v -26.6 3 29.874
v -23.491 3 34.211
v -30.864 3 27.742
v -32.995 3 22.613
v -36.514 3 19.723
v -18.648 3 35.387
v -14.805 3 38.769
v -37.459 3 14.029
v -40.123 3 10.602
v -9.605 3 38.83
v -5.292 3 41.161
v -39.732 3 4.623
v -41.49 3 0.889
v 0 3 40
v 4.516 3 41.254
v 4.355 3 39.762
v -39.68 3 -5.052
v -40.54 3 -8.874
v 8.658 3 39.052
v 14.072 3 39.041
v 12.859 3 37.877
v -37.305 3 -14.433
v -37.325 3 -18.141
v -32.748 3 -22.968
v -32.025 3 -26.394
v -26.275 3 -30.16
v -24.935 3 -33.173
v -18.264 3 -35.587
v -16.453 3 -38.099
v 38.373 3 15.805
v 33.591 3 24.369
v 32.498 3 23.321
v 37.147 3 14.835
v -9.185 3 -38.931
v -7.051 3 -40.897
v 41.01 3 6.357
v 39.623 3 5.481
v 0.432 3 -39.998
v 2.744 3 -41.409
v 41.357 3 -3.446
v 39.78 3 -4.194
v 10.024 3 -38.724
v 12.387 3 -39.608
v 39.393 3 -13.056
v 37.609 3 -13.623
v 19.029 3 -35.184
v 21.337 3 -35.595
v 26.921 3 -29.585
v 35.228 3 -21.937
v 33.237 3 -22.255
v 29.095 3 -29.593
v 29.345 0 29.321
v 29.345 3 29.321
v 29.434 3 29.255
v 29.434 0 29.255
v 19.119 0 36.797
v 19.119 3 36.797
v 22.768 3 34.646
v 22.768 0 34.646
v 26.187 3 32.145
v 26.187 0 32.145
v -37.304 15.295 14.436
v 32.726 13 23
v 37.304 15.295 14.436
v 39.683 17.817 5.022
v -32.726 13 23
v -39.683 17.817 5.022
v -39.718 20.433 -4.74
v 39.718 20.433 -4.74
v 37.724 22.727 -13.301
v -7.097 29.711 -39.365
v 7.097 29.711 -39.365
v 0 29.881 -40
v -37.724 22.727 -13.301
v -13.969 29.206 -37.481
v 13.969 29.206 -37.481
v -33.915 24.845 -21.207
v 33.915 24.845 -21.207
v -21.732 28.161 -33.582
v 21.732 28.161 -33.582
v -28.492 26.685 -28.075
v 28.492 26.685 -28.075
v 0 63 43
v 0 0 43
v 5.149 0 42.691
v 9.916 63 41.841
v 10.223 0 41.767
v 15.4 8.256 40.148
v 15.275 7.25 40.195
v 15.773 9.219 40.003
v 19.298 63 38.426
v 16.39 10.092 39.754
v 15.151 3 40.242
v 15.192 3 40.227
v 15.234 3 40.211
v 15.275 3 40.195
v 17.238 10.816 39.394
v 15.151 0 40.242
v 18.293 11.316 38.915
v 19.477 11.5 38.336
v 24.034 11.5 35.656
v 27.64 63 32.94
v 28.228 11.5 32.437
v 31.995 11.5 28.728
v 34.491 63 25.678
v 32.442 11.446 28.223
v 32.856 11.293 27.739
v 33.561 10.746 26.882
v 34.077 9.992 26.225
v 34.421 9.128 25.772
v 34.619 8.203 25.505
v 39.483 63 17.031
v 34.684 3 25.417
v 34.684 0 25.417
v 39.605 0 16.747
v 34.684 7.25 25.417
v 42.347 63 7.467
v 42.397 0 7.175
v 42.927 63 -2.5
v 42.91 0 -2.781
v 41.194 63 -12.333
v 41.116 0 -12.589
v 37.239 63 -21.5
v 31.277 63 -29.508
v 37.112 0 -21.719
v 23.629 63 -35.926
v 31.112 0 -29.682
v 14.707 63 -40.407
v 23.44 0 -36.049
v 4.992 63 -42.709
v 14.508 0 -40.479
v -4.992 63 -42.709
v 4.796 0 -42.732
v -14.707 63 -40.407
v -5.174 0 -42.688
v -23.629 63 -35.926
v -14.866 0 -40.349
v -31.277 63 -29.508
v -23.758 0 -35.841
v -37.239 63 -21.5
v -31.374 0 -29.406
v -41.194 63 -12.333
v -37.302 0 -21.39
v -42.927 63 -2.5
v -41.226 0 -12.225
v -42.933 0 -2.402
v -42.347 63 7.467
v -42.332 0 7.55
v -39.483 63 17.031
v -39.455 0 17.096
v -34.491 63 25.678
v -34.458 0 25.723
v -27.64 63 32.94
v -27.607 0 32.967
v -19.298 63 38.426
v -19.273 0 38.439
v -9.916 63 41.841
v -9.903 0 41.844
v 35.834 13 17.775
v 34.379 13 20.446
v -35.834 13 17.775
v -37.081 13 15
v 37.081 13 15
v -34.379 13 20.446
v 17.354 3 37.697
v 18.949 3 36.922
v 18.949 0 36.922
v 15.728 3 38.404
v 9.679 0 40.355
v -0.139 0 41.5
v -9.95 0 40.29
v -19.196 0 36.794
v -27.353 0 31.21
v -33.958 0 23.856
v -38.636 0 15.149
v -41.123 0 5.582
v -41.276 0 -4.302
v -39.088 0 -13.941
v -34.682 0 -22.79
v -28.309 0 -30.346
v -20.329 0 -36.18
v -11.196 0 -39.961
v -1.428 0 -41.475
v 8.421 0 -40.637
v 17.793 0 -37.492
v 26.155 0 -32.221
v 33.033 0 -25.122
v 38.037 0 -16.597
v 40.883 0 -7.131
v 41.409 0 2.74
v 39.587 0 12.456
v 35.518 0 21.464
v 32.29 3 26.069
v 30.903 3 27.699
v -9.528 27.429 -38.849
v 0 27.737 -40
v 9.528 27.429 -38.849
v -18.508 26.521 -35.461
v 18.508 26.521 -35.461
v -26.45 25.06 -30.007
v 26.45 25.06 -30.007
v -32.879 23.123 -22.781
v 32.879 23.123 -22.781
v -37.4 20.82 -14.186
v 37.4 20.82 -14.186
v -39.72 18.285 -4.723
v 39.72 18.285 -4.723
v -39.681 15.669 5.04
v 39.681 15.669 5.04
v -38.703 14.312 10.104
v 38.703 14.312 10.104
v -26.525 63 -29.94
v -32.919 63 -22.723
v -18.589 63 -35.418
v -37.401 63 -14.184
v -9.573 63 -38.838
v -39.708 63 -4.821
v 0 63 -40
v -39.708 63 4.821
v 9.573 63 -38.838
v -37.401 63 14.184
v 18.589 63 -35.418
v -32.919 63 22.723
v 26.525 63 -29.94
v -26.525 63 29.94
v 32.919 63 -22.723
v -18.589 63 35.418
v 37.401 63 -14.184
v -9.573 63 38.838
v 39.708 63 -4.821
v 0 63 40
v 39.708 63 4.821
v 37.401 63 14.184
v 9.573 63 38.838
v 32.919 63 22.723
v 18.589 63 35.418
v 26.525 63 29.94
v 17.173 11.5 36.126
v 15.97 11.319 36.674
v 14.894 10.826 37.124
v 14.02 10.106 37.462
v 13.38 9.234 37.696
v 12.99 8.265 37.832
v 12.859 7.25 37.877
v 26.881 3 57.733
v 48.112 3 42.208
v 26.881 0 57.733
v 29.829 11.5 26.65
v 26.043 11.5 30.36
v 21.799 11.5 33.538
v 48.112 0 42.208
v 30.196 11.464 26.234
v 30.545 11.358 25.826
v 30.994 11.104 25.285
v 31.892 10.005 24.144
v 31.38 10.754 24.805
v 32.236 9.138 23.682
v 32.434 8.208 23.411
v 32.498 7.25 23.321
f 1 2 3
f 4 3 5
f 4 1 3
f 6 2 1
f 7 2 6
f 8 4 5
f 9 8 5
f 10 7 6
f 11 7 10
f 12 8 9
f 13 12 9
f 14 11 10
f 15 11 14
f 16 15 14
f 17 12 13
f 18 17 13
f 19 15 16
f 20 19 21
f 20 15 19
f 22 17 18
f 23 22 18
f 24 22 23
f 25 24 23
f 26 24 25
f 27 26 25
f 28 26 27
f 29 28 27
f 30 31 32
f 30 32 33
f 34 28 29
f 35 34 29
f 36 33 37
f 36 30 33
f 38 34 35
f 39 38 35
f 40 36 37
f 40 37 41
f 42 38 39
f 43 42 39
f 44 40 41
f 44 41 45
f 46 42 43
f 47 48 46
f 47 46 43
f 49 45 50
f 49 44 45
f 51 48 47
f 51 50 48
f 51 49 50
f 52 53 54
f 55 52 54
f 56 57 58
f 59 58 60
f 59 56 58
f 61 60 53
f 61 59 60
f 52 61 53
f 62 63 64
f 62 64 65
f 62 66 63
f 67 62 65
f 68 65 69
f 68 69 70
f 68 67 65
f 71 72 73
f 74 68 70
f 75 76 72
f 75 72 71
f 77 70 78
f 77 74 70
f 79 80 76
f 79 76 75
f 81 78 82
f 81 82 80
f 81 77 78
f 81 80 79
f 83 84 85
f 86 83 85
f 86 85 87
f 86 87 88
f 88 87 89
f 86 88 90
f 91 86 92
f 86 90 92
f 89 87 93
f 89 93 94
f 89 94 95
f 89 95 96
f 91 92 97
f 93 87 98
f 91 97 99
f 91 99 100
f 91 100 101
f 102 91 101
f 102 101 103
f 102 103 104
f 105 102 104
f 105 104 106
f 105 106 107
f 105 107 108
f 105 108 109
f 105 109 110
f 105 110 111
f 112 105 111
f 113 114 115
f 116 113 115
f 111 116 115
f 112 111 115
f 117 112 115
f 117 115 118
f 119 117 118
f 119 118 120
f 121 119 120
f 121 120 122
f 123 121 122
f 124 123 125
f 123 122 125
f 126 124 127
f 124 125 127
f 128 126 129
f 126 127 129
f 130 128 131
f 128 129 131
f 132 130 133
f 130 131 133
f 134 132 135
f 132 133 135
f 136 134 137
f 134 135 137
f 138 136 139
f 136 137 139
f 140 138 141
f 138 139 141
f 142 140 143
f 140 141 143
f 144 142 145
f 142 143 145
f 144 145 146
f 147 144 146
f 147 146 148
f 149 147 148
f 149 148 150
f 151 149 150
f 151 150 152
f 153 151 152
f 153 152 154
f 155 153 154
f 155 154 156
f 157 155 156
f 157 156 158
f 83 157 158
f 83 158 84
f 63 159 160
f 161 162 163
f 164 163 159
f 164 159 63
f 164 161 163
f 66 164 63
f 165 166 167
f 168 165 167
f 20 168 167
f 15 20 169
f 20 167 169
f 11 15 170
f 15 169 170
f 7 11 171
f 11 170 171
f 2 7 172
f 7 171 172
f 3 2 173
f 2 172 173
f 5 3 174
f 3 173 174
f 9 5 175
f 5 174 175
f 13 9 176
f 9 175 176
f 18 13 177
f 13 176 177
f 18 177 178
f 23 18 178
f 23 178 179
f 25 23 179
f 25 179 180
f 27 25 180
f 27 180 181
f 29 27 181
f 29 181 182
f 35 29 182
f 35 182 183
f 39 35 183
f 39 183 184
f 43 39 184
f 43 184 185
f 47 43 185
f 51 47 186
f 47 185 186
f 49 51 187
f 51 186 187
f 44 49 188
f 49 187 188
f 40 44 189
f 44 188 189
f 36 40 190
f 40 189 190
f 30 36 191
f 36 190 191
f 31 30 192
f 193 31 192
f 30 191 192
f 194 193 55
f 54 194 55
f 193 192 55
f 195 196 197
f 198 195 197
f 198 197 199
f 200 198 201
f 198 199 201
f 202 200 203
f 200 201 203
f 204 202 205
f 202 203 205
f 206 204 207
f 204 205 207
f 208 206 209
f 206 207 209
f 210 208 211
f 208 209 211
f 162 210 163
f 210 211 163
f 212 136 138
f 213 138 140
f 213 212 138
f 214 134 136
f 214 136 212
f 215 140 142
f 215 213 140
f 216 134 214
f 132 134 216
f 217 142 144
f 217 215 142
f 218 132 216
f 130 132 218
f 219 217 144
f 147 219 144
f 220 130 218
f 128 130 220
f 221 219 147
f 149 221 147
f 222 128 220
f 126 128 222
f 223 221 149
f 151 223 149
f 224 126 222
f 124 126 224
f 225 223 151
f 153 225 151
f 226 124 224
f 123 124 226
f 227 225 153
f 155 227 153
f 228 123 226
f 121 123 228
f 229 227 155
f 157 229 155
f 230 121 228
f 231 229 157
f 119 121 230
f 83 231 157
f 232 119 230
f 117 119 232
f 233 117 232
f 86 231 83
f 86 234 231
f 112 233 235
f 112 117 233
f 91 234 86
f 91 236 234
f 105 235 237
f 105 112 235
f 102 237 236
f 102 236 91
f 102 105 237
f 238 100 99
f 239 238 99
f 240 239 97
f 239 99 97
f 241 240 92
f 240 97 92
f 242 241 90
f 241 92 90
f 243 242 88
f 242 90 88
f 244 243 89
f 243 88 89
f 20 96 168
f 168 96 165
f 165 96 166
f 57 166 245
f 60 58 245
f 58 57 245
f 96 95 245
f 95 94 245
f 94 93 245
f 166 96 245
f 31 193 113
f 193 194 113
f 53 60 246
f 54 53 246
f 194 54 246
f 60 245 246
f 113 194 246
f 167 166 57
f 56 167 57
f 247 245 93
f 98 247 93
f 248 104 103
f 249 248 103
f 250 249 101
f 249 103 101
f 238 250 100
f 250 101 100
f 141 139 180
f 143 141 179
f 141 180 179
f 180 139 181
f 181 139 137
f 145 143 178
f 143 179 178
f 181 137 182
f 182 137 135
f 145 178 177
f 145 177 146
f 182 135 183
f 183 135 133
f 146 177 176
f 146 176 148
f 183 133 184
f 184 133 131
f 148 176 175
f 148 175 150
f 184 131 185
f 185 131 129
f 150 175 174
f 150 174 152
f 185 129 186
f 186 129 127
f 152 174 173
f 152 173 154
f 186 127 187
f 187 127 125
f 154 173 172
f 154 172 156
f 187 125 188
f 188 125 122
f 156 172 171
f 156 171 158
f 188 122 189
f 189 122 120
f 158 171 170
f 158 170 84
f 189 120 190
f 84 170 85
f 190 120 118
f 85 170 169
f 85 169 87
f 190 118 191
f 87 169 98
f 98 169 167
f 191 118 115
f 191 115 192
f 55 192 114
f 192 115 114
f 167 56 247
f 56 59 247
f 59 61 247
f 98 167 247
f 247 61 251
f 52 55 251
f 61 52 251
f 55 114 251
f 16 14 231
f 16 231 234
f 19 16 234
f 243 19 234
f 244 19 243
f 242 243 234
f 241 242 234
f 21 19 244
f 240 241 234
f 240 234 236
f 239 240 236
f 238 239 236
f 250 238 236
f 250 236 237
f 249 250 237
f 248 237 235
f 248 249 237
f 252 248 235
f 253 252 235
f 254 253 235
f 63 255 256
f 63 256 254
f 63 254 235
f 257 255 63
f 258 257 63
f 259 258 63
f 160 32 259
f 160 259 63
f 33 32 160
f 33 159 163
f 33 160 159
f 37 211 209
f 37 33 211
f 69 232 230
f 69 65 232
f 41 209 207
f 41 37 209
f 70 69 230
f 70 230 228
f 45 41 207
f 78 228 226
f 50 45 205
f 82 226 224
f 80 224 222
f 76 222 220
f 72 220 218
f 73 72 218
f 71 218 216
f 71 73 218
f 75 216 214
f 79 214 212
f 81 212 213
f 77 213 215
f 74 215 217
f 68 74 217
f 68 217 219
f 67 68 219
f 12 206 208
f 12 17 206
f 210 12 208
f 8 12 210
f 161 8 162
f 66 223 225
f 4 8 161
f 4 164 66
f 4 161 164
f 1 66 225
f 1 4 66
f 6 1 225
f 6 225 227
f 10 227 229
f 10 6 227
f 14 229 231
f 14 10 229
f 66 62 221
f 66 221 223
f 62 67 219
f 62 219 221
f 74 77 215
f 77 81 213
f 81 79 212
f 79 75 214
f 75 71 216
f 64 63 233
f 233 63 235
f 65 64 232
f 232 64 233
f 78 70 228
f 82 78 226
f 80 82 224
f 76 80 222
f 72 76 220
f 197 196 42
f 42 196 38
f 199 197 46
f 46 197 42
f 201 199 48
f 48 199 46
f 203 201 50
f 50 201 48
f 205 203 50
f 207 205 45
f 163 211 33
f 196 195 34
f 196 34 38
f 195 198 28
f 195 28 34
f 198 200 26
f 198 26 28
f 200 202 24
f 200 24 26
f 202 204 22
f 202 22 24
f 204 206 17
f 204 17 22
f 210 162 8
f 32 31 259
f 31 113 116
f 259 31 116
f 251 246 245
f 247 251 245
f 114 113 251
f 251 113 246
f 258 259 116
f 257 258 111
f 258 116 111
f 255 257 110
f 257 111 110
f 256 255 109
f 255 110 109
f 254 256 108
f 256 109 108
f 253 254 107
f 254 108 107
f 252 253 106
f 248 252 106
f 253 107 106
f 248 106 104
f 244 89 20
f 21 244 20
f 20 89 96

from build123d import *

# Parameters (mm, degrees)
SKETCH1_R                            = 43
SKETCH1_R_2                          = 40
BOSS_EXTRUDE1_DEPTH                  = 63
SKETCH2_R                            = 41.5
SKETCH2_R_2                          = 40
CUT_EXTRUDE1_DEPTH                   = 3
BOSS_EXTRUDE2_REACH                  = 89.561
BOSS_EXTRUDE2_END_RADIUS             = 40
BOSS_EXTRUDE2_DIRECTION_2_REACH      = 89.561
BOSS_EXTRUDE2_DIRECTION_2_END_RADIUS = 40
BOSS_EXTRUDE3_DEPTH                  = 70
CUT_EXTRUDE2_REACH                   = 125.284
CUT_EXTRUDE2_END_RADIUS              = 40
CUT_EXTRUDE3_DEPTH                   = 100.163089401
BOSS_EXTRUDE6_DEPTH                  = 3
CUT_EXTRUDE4_DEPTH                   = 4


with BuildPart() as part:
    # Sketch1 → Boss-Extrude1 (new body)
    with BuildSketch(Plane(origin=(0, 0, 0), x_dir=(1, 0, 0), z_dir=(0, 1, 0))):
        with Locations(Location((0, 0, 0), (0, 0, 270))):
            Circle(SKETCH1_R)
        with Locations(Location((0, 0, 0), (0, 0, 270))):
            Circle(SKETCH1_R_2, mode=Mode.SUBTRACT)
    extrude(amount=BOSS_EXTRUDE1_DEPTH)

    # Sketch2 → Cut-Extrude1 (cut)
    with BuildSketch(Plane(origin=(0, 0, 0), x_dir=(-1, 0, 0), z_dir=(0, -1, 0))):
        with Locations(Location((0, 0, 0), (0, 0, 90))):
            Circle(SKETCH2_R)
        with Locations(Location((0, 0, 0), (0, 0, 90))):
            Circle(SKETCH2_R_2, mode=Mode.SUBTRACT)
    extrude(amount=-CUT_EXTRUDE1_DEPTH, mode=Mode.SUBTRACT)

    # Boss-Extrude2: up to this cylinder (the profile starts inside it)
    boss_extrude2_end = Plane(origin=(0, 21.31795, 0), z_dir=(0, -1, 0)) * Cylinder(BOSS_EXTRUDE2_END_RADIUS, 260.122, mode=Mode.PRIVATE)
    # Sketch4 → Boss-Extrude2 (add, up to the surface)
    with BuildSketch(Plane(origin=(0, 0, 0), x_dir=(0, 0, -1), z_dir=(1, 0, 0)), mode=Mode.PRIVATE) as boss_extrude2_sk1:
        Polygon((-23, 13), (43, 30.6846467), (43, 28.541053161), (-15, 13), align=None)
    boss_extrude2_tool1 = extrude(boss_extrude2_sk1.sketch, amount=-BOSS_EXTRUDE2_REACH, mode=Mode.PRIVATE) & boss_extrude2_end
    add(boss_extrude2_tool1.solids().sort_by_distance((0, 21.31795, -11.956989))[0])

    # Boss-Extrude2 direction 2: up to this cylinder (the profile starts inside it)
    boss_extrude2_direction_2_end = Plane(origin=(0, 21.31795, 0), z_dir=(0, -1, 0)) * Cylinder(BOSS_EXTRUDE2_DIRECTION_2_END_RADIUS, 260.122, mode=Mode.PRIVATE)
    # Sketch4 → Boss-Extrude2 direction 2 (add, up to the surface)
    with BuildSketch(Plane(origin=(0, 0, 0), x_dir=(0, 0, -1), z_dir=(1, 0, 0)), mode=Mode.PRIVATE) as boss_extrude2_direction_2_sk1:
        Polygon((-23, 13), (43, 30.6846467), (43, 28.541053161), (-15, 13), align=None)
    boss_extrude2_direction_2_tool1 = extrude(boss_extrude2_direction_2_sk1.sketch, amount=BOSS_EXTRUDE2_DIRECTION_2_REACH, mode=Mode.PRIVATE) & boss_extrude2_direction_2_end
    add(boss_extrude2_direction_2_tool1.solids().sort_by_distance((0, 21.31795, -11.956989))[0])


with BuildPart() as body_2:
    # Sketch5 → Boss-Extrude3 (new body)
    with BuildSketch(Plane(origin=(0, 63, 0), x_dir=(1, 0, 0), z_dir=(0, 1, 0))):
        Polygon((7.74910462, -54.037683176), (34.954425762, -25.676995378), (36.517040035, -27.175951378), (9.311718893, -55.536639176), align=None)
    extrude(amount=-BOSS_EXTRUDE3_DEPTH)


with BuildPart() as cut_extrude2_tool:
    # Cut-Extrude2: up to this cylinder (the profile starts outside it)
    cut_extrude2_end = Plane(origin=(0, 7.120173, 0), z_dir=(0, -1, 0)) * Cylinder(CUT_EXTRUDE2_END_RADIUS, 331.568, mode=Mode.PRIVATE)
    # Sketch6 → Cut-Extrude2 (new, up to the surface)
    with BuildSketch(Plane(origin=(32.59371092, 0, 31.265898031), x_dir=(0.6922545038449902, 0, -0.7216534500065296), z_dir=(0.7216534500065296, 0, 0.6922545038449902)), mode=Mode.PRIVATE) as cut_extrude2_sk1:
        with BuildLine():
            Line((-18.432533638, 7.25), (-18.432533638, 3))
            Line((-18.432533638, 3), (5.667466362, 3))
            Line((5.667466362, 3), (5.667466362, 7.25))
            ThreePointArc((5.667466362, 7.25), (4.422670182, 10.25520382), (1.417466362, 11.5))
            Line((1.417466362, 11.5), (-14.182533638, 11.5))
            ThreePointArc((-14.182533638, 11.5), (-17.187737458, 10.25520382), (-18.432533638, 7.25))
        make_face()
    cut_extrude2_tool1 = extrude(cut_extrude2_sk1.sketch, amount=-CUT_EXTRUDE2_REACH, mode=Mode.PRIVATE) - cut_extrude2_end
    add(cut_extrude2_tool1.solids().sort_by_distance((28.175373, 7.120173, 35.871875))[0])


with BuildPart() as part_1:
    add(part.part)

    # Cut-Extrude2: cut by cut_extrude2_tool
    add(cut_extrude2_tool.part, mode=Mode.SUBTRACT)

    # Sketch11 → Boss-Extrude6 (add)
    with BuildSketch(Plane(origin=(0, 3, 0), x_dir=(1, 0, 0), z_dir=(0, 1, 0))):
        Polygon((14.90592475, -39.87722305), (34.683715998, -25.417313874), (48.112422428, -42.207782707), (26.881207412, -57.733387396), align=None)
    extrude(amount=-BOSS_EXTRUDE6_DEPTH)

    # Sketch12 → Cut-Extrude4 (cut)
    with BuildSketch(Plane(origin=(0, 0, 0), x_dir=(-1, 0, 0), z_dir=(0, -1, 0))):
        with BuildLine():
            Line((-30.912368333, -27.688857915), (-14.530563251, -38.873033476))
            ThreePointArc((-14.530563251, -38.873033476), (-23.375174905, -34.238453489), (-30.912368333, -27.688857915))
        make_face()
    extrude(amount=-CUT_EXTRUDE4_DEPTH, mode=Mode.SUBTRACT)


with BuildPart() as body_2_1:
    add(body_2.part)

    # Cut-Extrude2: cut by cut_extrude2_tool
    add(cut_extrude2_tool.part, mode=Mode.SUBTRACT)

    # Sketch7 → Cut-Extrude3 (cut, through all)
    with BuildSketch(Plane(origin=(0, 63, 0), x_dir=(1, 0, 0), z_dir=(0, 1, 0))):
        Polygon((34.954425762, -25.676995378), (36.517040035, -27.175951378), (9.311718893, -55.536639176), (7.74910462, -54.037683176), align=None)
    extrude(amount=-CUT_EXTRUDE3_DEPTH, mode=Mode.SUBTRACT)


solid = part_1.part
